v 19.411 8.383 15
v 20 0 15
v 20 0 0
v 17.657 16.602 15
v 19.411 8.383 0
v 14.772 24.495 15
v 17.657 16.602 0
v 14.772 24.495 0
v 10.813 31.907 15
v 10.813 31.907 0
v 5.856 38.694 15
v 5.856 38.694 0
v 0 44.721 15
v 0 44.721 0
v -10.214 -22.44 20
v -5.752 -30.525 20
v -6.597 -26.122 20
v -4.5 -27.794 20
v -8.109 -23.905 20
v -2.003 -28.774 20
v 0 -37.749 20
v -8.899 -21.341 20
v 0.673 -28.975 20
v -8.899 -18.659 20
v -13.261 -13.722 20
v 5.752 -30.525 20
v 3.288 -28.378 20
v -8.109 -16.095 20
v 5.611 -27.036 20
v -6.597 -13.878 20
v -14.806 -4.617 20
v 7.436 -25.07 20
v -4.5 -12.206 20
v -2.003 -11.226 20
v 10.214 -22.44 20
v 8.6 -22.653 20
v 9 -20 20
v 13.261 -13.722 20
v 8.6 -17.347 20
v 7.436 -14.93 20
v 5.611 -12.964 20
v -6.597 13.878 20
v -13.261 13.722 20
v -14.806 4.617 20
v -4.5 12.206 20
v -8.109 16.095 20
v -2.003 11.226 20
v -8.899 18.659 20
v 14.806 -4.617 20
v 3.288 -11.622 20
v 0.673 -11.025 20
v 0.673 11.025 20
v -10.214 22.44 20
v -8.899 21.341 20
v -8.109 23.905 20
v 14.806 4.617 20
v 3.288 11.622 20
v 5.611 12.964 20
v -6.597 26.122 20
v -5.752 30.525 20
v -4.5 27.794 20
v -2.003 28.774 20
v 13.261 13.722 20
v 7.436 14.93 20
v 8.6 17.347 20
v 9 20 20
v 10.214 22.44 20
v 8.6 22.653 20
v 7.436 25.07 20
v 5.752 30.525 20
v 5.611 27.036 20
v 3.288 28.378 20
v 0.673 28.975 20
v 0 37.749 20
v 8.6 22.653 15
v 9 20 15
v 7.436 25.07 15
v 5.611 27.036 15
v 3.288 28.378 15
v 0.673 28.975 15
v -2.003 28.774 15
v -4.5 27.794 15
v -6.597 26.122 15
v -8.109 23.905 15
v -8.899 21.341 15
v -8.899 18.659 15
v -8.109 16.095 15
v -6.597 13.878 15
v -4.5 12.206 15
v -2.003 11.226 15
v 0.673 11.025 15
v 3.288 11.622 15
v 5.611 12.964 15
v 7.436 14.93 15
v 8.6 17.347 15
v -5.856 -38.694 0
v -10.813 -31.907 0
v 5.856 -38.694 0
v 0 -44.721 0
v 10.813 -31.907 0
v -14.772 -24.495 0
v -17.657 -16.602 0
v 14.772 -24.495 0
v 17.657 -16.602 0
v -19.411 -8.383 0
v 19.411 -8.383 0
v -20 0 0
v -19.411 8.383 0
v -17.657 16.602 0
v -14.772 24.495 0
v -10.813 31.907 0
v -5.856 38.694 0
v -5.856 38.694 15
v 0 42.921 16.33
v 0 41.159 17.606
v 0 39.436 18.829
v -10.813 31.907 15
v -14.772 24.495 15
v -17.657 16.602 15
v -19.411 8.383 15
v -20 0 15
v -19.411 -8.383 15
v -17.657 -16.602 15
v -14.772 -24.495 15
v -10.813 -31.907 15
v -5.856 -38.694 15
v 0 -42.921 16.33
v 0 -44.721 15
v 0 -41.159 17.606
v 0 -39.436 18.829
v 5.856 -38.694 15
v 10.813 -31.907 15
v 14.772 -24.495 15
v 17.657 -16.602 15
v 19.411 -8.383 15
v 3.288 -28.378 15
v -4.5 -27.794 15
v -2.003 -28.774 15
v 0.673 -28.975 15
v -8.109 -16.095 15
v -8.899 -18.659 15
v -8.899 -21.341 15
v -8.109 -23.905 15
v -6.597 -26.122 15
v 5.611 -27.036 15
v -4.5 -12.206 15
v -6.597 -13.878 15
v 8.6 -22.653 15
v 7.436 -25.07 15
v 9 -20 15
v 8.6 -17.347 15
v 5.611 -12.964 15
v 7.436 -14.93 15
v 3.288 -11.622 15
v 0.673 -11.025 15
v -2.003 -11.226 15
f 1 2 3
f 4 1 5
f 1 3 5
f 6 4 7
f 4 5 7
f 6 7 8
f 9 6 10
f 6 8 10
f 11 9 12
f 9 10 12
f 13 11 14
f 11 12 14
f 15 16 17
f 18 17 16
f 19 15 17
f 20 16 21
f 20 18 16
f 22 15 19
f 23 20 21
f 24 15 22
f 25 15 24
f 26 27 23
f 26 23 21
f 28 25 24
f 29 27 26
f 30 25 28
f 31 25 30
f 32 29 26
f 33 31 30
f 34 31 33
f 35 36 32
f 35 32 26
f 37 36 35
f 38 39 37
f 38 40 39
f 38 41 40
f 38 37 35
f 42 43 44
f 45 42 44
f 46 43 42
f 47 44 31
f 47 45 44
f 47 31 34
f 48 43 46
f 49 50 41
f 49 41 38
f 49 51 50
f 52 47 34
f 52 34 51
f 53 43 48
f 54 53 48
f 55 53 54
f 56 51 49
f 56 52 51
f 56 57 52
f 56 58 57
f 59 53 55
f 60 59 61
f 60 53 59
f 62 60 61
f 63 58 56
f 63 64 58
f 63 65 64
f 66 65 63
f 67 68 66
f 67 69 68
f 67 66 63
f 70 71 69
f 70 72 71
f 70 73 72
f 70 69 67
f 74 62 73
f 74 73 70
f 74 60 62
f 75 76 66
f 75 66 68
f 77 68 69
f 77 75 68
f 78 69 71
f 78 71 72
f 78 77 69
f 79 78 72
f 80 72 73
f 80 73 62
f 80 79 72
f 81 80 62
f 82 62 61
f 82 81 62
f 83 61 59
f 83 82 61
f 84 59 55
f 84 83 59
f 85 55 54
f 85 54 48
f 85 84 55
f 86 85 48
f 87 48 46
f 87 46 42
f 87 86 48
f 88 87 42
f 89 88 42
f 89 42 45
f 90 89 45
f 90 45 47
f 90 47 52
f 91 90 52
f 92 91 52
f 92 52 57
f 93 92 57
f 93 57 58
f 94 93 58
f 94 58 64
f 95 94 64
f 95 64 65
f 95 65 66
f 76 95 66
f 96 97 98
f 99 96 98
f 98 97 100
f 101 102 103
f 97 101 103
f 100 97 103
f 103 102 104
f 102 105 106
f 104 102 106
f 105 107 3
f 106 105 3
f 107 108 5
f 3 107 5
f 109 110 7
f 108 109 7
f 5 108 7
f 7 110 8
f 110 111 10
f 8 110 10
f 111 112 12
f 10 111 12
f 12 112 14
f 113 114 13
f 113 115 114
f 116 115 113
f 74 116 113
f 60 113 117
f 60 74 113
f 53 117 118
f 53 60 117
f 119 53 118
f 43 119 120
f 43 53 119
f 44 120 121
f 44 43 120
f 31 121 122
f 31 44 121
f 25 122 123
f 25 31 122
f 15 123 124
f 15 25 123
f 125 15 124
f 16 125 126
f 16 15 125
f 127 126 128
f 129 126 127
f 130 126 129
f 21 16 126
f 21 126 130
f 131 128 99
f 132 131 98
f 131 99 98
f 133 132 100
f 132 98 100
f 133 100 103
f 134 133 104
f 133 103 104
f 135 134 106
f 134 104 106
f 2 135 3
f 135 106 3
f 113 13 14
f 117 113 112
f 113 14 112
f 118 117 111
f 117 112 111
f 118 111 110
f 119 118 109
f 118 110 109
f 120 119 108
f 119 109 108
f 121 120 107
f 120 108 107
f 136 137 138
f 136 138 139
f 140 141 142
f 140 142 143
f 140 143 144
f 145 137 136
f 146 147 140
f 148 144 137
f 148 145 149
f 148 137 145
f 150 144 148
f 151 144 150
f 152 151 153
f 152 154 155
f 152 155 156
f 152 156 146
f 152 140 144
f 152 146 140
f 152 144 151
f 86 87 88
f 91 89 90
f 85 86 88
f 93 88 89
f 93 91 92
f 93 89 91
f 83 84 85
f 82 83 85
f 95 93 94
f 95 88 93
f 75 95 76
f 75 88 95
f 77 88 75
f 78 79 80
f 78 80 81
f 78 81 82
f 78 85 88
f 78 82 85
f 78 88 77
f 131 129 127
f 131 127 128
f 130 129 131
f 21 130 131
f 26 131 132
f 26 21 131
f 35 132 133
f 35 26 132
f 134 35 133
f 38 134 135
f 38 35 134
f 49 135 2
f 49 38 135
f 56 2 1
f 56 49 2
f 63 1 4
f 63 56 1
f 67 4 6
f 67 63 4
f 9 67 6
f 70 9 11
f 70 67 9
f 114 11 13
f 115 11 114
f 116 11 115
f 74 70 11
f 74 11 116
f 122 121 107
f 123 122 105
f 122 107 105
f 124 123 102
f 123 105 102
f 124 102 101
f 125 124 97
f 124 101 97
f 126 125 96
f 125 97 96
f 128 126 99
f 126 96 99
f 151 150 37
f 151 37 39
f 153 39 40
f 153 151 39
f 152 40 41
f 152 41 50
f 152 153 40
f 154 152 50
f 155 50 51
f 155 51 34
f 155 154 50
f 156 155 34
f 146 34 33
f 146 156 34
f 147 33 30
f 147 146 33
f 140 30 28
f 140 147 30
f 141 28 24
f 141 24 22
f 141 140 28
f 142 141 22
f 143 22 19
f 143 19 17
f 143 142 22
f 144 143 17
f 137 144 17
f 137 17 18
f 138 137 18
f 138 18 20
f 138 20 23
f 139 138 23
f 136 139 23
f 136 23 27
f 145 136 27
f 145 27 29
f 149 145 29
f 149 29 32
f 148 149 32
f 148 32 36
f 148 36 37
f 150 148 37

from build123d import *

# Parameters (mm, degrees)
F0_R        = 9
F1_DEPTH    = 20
F2_DEPTH    = 15
F3_T2_ANGLE = 120.9484473771
F3_T4_ANGLE = 120.9484473771


# Not quite as in the source:
# - a fillet or chamfer that OpenCascade refuses, or shapes differently, is made with other operations: its cross-section is extruded or revolved along the edge and cut away or added


with BuildPart() as f1:
    # F0 (on Top) → F1 (new body)
    with BuildSketch(Plane.XY):
        with BuildLine():
            Line((-20, 0), (0, 0))
            Line((0, 0), (20, 0))
            ThreePointArc((20, 0), (14.7722557505, 24.4948974278), (0, 44.72135955))
            ThreePointArc((0, 44.72135955), (-14.7722557505, 24.4948974278), (-20, 0))
        make_face()
        with Locations((0, 20)):
            Circle(F0_R, mode=Mode.SUBTRACT)
        with BuildLine():
            Line((20, 0), (0, 0))
            Line((0, 0), (-20, 0))
            ThreePointArc((-20, 0), (-14.7722557505, -24.4948974278), (0, -44.72135955))
            ThreePointArc((0, -44.72135955), (14.7722557505, -24.4948974278), (20, 0))
        make_face()
        with Locations((0, -20)):
            Circle(F0_R, mode=Mode.SUBTRACT)
    extrude(amount=F1_DEPTH)

    # F0 (on Top) → F2 (join)
    with BuildSketch(Plane.XY):
        with Locations((0, -20)):
            Circle(F0_R)
        with Locations((0, 20)):
            Circle(F0_R)
    extrude(amount=F2_DEPTH)

    # F3: chamfer of 5 on 2 edges, made by hand

    # F3_s1 → F3_t2 (revolve, cut)
    with BuildSketch(Plane(origin=(-30.2853323821, -17.1526073175, 0), x_dir=(0, 0, 1), z_dir=(-0.8701340756, -0.4928150672, 0))):
        Polygon((15, -40.2873973125), (20, -35.2873973125), (20, -40.2873973125), align=None)
    revolve(axis=Axis((-40, 0, 20), (0, 0, 1)), revolution_arc=F3_T2_ANGLE, mode=Mode.SUBTRACT)

    # F3_s3 → F3_t4 (revolve, cut)
    with BuildSketch(Plane(origin=(30.2853323821, 17.1526073175, 0), x_dir=(0, 0, 1), z_dir=(0.8701340756, 0.4928150672, 0))):
        Polygon((15, -40.2873973125), (20, -35.2873973125), (20, -40.2873973125), align=None)
    revolve(axis=Axis((40, 0, 20), (0, 0, 1)), revolution_arc=F3_T4_ANGLE, mode=Mode.SUBTRACT)


solid = f1.part
